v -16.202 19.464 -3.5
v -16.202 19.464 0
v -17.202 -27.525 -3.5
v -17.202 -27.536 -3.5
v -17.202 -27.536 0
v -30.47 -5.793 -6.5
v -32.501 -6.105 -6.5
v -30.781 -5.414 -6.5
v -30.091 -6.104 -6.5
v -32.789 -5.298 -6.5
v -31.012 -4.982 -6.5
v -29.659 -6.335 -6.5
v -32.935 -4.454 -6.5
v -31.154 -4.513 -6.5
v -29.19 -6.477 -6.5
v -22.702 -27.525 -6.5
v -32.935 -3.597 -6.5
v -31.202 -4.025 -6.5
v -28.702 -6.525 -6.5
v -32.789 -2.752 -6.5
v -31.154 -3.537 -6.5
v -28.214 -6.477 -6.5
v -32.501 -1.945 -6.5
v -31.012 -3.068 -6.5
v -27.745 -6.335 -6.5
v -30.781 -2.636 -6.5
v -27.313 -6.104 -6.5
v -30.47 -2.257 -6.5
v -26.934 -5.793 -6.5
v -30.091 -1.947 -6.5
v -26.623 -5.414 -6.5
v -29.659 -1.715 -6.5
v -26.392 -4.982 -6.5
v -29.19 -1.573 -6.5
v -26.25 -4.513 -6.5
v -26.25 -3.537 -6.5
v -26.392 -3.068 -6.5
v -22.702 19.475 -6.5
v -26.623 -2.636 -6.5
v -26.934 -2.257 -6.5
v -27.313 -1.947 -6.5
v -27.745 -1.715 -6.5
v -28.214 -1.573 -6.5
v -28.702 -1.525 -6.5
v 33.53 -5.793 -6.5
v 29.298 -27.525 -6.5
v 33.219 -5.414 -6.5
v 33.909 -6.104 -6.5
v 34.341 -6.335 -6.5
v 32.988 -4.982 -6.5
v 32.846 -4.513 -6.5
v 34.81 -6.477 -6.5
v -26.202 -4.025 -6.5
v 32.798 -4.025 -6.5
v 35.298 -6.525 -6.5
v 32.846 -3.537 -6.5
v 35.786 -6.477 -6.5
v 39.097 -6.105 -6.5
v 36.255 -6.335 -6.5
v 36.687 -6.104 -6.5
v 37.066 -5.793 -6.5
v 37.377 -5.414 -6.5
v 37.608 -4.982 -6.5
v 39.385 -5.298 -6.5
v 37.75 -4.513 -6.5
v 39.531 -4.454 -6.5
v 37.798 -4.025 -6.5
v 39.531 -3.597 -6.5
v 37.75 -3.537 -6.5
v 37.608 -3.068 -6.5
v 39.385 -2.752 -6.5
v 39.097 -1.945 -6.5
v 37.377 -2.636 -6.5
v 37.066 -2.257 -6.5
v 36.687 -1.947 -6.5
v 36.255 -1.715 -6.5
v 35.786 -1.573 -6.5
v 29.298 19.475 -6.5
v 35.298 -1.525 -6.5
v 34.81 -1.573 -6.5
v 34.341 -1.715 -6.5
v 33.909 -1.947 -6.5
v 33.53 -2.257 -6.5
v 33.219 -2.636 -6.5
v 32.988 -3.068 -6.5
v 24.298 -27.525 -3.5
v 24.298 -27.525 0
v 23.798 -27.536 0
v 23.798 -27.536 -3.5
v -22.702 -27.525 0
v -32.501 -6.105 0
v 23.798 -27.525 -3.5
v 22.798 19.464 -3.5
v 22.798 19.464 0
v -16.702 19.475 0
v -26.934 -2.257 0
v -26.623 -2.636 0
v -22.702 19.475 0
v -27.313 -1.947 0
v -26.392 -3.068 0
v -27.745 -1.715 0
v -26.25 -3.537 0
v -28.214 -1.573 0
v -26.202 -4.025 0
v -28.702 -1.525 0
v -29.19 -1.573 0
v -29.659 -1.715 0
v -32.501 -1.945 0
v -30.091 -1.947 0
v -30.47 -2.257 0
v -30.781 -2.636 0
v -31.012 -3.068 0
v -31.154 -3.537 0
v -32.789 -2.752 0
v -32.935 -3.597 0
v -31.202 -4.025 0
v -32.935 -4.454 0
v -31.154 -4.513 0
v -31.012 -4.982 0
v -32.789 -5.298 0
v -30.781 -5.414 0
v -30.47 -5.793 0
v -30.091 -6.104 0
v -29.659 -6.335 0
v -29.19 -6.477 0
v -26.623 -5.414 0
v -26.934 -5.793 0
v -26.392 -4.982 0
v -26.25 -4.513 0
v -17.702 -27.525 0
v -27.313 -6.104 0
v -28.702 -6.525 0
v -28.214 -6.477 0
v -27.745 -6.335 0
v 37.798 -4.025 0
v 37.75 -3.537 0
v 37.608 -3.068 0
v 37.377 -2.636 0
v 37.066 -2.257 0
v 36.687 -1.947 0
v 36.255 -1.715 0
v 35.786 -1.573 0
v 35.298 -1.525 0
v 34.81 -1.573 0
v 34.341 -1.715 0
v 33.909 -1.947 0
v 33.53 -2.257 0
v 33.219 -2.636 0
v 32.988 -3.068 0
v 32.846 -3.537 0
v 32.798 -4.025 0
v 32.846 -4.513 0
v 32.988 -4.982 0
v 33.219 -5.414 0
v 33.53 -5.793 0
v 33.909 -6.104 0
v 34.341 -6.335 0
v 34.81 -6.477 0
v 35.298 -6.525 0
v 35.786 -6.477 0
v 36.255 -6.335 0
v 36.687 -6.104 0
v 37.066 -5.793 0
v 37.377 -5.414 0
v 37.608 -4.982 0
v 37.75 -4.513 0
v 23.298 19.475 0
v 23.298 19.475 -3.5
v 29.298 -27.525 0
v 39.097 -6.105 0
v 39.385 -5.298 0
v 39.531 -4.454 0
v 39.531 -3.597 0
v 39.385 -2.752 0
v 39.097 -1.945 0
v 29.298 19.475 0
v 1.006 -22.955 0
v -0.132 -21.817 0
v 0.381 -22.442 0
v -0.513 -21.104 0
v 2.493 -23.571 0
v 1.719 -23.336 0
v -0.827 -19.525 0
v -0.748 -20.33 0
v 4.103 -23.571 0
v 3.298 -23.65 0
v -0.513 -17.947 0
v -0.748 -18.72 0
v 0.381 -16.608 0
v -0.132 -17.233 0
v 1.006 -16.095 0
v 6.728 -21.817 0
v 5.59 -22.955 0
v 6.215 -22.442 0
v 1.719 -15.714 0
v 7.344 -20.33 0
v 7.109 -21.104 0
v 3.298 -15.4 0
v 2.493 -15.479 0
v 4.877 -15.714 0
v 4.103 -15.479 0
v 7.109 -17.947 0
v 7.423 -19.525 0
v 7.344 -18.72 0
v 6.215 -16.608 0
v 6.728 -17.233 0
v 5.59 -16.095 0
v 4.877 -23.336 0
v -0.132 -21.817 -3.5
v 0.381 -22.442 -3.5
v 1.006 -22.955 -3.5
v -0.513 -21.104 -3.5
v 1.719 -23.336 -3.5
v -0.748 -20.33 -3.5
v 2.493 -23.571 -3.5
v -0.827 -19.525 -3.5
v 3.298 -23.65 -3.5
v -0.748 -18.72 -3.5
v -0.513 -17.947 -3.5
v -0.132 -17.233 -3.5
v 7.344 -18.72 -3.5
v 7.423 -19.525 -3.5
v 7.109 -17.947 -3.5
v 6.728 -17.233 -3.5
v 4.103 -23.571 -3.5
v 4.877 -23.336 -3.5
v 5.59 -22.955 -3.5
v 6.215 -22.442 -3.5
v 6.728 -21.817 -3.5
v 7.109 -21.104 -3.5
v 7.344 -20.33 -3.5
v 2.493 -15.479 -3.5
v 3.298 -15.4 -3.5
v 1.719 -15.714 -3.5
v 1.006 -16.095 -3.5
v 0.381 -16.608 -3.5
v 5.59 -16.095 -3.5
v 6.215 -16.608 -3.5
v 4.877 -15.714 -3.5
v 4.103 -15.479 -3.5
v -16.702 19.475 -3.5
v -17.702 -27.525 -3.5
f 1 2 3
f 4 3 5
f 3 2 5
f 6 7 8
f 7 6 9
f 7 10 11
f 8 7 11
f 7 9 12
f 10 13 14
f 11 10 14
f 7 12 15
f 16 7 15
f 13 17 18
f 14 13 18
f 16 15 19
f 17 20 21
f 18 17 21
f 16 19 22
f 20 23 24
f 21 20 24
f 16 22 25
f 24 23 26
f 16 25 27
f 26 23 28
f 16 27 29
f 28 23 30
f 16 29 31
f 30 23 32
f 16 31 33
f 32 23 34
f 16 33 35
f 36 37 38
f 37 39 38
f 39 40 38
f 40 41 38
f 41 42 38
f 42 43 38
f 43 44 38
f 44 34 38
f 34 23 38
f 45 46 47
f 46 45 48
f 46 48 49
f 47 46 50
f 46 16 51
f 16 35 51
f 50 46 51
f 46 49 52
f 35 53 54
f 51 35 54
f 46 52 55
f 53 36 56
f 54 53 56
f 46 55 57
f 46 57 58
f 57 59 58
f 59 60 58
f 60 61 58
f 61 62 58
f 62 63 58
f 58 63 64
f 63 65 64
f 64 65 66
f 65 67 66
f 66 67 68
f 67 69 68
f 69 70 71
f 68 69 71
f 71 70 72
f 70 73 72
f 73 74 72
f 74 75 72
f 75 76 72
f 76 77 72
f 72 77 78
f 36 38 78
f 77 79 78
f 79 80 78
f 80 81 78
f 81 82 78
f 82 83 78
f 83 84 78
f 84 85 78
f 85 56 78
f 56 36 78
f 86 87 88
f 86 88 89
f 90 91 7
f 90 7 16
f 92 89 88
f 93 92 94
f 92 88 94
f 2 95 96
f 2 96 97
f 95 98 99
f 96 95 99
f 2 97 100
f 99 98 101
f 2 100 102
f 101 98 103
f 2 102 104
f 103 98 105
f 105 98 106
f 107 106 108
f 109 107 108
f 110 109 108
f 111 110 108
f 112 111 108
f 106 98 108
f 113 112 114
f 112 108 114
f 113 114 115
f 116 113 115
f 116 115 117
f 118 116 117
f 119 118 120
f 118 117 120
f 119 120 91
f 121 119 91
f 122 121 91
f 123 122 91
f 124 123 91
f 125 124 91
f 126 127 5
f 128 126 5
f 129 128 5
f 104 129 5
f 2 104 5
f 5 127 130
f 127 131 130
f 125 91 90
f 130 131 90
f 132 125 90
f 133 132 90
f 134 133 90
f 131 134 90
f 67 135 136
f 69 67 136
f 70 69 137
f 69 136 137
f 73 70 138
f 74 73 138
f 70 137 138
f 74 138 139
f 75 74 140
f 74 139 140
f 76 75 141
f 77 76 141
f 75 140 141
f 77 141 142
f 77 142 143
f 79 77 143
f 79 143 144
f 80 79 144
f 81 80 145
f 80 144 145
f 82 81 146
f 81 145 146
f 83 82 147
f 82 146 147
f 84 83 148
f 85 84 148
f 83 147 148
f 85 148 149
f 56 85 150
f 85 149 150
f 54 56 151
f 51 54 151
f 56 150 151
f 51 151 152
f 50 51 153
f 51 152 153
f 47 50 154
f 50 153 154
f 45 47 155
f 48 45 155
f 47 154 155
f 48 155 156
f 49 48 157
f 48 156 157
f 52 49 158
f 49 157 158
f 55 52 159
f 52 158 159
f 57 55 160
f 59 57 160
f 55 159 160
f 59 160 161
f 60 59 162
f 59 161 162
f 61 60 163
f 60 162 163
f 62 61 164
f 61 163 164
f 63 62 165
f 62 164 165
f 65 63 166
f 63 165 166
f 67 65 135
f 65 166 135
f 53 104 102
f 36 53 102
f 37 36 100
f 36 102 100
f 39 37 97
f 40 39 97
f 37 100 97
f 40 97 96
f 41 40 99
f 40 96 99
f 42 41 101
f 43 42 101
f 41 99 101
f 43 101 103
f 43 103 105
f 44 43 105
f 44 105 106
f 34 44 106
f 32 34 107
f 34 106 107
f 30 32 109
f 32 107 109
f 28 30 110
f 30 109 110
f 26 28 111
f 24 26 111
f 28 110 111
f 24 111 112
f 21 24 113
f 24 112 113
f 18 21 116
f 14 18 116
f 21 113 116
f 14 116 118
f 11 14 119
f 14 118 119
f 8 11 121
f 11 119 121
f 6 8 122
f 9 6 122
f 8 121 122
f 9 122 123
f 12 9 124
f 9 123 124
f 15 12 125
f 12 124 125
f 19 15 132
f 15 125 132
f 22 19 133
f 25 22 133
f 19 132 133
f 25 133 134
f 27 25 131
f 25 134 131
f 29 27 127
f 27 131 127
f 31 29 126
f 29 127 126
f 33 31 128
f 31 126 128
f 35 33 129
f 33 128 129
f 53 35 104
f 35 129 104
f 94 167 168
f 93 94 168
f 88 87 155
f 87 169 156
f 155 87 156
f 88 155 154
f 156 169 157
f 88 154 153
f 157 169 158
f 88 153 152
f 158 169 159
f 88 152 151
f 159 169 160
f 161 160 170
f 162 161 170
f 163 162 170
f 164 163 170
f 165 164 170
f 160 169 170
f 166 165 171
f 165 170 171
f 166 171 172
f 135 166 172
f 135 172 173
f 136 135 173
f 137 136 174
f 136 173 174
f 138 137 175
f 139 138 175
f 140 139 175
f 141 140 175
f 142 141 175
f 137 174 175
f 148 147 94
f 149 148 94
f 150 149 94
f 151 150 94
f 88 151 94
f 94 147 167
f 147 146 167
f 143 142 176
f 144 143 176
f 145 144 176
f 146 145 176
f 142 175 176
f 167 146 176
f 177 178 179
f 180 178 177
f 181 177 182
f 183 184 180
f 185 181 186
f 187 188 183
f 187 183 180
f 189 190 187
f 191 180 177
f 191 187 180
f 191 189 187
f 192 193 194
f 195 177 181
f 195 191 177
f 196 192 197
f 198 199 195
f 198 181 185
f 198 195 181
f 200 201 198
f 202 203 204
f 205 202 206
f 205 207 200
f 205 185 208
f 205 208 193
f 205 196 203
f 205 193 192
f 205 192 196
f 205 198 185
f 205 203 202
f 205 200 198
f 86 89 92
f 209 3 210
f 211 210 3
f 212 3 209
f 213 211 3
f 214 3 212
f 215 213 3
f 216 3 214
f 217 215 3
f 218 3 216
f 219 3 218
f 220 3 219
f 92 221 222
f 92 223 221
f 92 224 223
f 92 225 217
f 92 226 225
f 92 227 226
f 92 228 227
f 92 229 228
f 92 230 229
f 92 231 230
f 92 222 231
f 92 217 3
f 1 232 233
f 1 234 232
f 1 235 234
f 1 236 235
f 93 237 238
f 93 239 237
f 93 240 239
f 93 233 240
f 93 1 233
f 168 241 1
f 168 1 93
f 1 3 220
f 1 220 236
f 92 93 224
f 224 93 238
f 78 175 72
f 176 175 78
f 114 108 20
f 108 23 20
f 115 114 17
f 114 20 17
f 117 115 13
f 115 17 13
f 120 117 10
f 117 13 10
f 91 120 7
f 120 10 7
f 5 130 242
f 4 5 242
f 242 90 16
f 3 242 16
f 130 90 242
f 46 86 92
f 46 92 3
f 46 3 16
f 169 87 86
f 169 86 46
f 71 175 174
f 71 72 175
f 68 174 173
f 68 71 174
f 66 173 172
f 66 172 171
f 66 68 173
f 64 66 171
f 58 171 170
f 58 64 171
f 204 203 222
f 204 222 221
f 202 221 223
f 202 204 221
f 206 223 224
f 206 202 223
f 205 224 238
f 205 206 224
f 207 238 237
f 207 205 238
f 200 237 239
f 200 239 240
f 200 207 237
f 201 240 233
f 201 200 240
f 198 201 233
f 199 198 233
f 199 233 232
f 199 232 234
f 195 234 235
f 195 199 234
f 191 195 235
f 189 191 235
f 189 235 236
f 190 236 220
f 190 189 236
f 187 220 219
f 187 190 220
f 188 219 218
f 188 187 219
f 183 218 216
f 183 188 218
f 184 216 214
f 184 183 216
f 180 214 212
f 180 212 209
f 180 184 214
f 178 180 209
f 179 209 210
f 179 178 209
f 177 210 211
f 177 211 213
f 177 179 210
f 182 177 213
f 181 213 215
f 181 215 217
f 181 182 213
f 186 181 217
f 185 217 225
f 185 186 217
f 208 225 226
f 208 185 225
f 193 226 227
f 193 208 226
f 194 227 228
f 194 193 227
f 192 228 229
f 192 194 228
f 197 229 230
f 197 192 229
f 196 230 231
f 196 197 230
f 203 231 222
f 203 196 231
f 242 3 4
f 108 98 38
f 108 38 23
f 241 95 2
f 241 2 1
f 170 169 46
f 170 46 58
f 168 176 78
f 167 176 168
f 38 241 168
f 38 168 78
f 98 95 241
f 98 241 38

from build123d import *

# Parameters (mm, degrees)
F0_R     = 2.5
F0_R_2   = 4.125
F1_DEPTH = 6.5
F2_DEPTH = 3.5
F3_R     = 5
F4_DEPTH = 0.5
F5_DEPTH = 0.5


# Not quite as in the source:
# - a feature names something its author has since deleted; it is built from what else it names


with BuildPart() as f1:
    # F0 (on Top) → F1 (new body)
    with BuildSketch(Plane.XY):
        Polygon((-16.7020111382, 19.4748209119), (-22.7020111382, 19.4748209119), (-33.4520111382, -4.0251790881), (-22.7020111382, -27.5251790881), (-17.7020111382, -27.5251790881), align=None)
        with Locations((-28.7020111382, -4.0251790881)):
            Circle(F0_R, mode=Mode.SUBTRACT)
        Polygon((23.2979888618, 19.4748209119), (-16.7020111382, 19.4748209119), (-17.7020111382, -27.5251790881), (24.2979888618, -27.5251790881), align=None)
        with Locations((3.2979888618, -19.5251790881)):
            Circle(F0_R_2, mode=Mode.SUBTRACT)
        Polygon((29.2979888618, 19.4748209119), (23.2979888618, 19.4748209119), (24.2979888618, -27.5251790881), (29.2979888618, -27.5251790881), (40.0479888618, -4.0251790881), align=None)
        with Locations((35.2979888618, -4.0251790881)):
            Circle(F0_R, mode=Mode.SUBTRACT)
        with Locations((3.2979888618, -19.5251790881)):
            Circle(F0_R_2)
    extrude(amount=-F1_DEPTH)

    # F0 (on Top) → F2 (cut)
    with BuildSketch(Plane.XY):
        Polygon((23.2979888618, 19.4748209119), (-16.7020111382, 19.4748209119), (-17.7020111382, -27.5251790881), (24.2979888618, -27.5251790881), align=None)
        with Locations((3.2979888618, -19.5251790881)):
            Circle(F0_R_2, mode=Mode.SUBTRACT)
    extrude(amount=-F2_DEPTH, mode=Mode.SUBTRACT)

    # F3
    f3_edges = [f1.edges().sort_by_distance(p)[0] for p in [
        (-33.452011, -4.025179, -3.25),
        (40.047989, -4.025179, -3.25),
    ]]
    fillet(f3_edges, radius=F3_R)

    # F4 (add): a face of the model
    f4_faces = [f1.faces().sort_by_distance(p)[0] for p in [
        (-17.2020111382, -4.0251790881, -1.75),
    ]]
    extrude(f4_faces, amount=F4_DEPTH)

    # F5 (add): a face of the model
    f5_faces = [f1.faces().sort_by_distance(p)[0] for p in [
        (23.7979888618, -4.0251790881, -1.75),
    ]]
    extrude(f5_faces, amount=F5_DEPTH)


solid = f1.part
